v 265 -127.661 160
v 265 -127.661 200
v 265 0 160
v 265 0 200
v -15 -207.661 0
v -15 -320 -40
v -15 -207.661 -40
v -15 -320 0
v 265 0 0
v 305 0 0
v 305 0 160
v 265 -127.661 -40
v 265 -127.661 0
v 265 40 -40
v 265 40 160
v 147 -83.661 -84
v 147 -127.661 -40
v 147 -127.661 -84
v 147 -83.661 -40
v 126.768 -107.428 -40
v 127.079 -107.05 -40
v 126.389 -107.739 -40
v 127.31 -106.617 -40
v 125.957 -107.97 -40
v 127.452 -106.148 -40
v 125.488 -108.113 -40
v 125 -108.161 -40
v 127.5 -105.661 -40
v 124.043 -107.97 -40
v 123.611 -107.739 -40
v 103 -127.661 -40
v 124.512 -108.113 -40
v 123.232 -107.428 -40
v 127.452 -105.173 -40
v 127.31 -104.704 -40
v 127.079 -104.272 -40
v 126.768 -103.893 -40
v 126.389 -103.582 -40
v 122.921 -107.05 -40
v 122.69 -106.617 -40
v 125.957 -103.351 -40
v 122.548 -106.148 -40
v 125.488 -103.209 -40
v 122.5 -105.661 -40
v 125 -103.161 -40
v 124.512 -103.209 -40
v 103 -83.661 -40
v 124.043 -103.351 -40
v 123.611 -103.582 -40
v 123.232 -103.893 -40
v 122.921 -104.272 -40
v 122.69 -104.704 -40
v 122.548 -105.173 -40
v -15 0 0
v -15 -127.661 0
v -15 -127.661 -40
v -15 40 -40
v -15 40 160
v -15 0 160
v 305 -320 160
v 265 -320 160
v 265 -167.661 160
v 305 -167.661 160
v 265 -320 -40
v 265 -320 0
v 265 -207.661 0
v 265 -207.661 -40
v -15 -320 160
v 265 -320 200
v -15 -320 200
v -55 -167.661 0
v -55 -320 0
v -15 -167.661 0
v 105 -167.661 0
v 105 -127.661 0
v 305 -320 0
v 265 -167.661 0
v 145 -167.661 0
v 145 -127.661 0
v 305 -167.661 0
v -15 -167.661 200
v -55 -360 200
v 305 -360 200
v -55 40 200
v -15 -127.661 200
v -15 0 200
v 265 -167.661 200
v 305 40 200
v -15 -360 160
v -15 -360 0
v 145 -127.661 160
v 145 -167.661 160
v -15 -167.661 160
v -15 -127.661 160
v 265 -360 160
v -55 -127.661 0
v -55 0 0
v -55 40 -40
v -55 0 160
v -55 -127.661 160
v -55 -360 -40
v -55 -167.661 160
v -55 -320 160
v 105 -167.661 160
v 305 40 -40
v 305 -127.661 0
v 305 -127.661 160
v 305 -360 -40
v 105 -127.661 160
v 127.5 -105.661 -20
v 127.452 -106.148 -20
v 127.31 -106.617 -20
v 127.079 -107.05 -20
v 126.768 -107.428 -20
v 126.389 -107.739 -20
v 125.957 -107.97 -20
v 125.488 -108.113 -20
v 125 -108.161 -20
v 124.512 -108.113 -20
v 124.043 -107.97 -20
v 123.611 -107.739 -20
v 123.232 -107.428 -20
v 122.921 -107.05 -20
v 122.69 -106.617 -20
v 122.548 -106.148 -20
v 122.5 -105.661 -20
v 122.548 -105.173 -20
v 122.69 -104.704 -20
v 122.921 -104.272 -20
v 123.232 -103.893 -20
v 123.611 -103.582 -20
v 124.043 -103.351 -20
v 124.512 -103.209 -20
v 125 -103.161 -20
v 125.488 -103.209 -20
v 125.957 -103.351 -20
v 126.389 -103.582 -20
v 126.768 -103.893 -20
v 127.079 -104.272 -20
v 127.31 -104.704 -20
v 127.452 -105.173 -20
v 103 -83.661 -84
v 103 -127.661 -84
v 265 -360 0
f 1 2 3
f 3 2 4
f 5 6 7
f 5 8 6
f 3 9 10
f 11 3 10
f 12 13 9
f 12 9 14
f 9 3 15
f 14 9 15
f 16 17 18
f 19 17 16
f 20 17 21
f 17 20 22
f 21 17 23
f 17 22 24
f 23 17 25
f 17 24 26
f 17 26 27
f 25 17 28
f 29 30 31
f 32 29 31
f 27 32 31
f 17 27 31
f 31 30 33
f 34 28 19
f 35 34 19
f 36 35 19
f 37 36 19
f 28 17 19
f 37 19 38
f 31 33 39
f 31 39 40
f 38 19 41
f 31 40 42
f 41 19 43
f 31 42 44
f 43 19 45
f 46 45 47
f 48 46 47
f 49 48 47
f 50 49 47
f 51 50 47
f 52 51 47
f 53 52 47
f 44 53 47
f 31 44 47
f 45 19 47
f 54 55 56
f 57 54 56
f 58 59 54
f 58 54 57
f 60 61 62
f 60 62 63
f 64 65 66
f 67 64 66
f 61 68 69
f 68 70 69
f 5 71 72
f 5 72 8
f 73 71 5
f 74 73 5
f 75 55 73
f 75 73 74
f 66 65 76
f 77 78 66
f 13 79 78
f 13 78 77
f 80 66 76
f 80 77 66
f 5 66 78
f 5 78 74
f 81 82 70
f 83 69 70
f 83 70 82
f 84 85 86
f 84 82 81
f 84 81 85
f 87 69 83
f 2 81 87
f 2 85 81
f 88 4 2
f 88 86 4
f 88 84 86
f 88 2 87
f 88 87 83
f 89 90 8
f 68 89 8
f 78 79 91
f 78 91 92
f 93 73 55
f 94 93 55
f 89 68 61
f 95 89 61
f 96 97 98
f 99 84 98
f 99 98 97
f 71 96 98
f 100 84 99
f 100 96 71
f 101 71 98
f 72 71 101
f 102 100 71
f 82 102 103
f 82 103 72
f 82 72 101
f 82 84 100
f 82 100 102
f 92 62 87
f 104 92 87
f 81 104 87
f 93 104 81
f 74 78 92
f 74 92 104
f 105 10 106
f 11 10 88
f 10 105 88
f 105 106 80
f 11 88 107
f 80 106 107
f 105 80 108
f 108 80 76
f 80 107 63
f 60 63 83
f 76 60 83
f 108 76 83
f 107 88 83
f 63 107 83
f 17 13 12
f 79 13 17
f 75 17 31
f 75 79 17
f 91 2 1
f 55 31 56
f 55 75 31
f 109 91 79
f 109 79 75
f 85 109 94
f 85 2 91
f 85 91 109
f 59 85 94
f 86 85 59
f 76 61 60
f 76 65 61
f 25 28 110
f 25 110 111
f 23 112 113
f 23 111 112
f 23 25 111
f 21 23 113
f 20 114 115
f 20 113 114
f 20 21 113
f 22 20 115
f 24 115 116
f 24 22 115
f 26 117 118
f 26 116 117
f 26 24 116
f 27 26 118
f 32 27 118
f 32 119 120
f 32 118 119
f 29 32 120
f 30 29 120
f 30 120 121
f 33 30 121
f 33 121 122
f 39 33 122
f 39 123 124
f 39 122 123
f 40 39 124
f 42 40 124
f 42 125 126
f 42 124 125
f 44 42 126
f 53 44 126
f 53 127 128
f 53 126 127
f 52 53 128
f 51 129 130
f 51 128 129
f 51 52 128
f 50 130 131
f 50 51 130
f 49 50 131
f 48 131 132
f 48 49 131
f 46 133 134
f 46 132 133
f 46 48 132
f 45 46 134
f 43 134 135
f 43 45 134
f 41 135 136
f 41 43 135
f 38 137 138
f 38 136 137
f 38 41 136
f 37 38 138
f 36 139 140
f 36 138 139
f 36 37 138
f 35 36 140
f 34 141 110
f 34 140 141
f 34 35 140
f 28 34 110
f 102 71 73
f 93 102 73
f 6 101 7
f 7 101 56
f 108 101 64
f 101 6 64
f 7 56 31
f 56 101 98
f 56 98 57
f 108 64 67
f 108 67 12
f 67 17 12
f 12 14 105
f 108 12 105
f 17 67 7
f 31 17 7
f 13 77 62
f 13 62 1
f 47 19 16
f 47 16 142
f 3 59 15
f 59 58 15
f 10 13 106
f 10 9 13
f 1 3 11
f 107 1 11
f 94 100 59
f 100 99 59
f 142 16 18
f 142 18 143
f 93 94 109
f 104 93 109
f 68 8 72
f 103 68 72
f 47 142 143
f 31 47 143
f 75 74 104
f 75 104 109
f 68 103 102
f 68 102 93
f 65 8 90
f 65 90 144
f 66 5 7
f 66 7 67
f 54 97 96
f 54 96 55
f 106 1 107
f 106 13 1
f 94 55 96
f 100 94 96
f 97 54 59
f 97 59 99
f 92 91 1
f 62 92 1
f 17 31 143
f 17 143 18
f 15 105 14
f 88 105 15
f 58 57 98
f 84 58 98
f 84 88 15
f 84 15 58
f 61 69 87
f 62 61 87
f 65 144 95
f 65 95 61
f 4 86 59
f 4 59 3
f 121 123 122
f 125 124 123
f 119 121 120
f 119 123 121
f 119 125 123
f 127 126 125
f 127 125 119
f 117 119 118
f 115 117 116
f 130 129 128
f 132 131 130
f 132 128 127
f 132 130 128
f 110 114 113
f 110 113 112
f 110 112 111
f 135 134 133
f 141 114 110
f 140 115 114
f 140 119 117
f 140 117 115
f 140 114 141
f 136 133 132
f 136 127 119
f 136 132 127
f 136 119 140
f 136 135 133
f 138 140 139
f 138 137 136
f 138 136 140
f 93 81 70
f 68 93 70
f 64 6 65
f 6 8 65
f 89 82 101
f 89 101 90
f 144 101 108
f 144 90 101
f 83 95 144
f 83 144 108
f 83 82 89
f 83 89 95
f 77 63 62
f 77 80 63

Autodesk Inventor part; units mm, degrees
ref_plane "YZ Plane" through (0, 0, 0) normal (1, 0, 0) x (0, 1, 0)
ref_plane "XZ Plane" through (0, 0, 0) normal (0, 1, 0) x (-1, 0, 0)
ref_plane "XY Plane" through (0, 0, 0) normal (0, 0, 1) x (1, 0, 0)
sketch "Sketch1" plane through (0, 0, 0) normal (0, 0, 1) x (1, 0, 0)
  line L0 (250, 0) -> (0, 0) projected
  line L1 (250, 0) -> (250, 40) projected
  line L2 (211.5, 40) -> (250, 40) projected
  line L3 (161.5, 40) -> (211.5, 40) projected
  line L4 (88.5, 40) -> (161.5, 40) projected
  line L5 (38.5, 40) -> (88.5, 40) projected
  line L6 (0, 40) -> (38.5, 40) projected
  line L7 (0, 0) -> (0, 40) projected
  line L8 (-15, 40) -> (-55, 40)
  line L9 (-55, 40) -> (-55, -360)
  line L10 (-55, -360) -> (-15, -360)
  line L11 (-15, -360) -> (-15, 40)
  line L12 (265, 40) -> (305, 40)
  line L13 (305, 40) -> (305, -360)
  line L14 (305, -360) -> (265, -360)
  line L15 (265, -360) -> (265, 40)
  line L16 (265, -360) -> (-15, -360)
  line L17 (-15, -360) -> (-15, -320)
  line L18 (-15, -320) -> (265, -320)
  line L19 (265, -320) -> (265, -360)
  line L20 (265, -127.6607) -> (-15, -127.6607)
  line L21 (-15, -127.6607) -> (-15, -207.6607)
  line L22 (-15, -207.6607) -> (265, -207.6607)
  line L23 (265, -207.6607) -> (265, -127.6607)
  dimension "d0" = 40
  dimension "d1" = 400
  dimension "d2" = 40
  dimension "d3" = 400
  dimension "d4" = 15
  dimension "d5" = 15
  dimension "d6" = 40
  dimension "d9" = 80
extrude "Extrusion1" add sketch "Sketch1" against normal blind 40 contours L11 L10 L9 L8 | L20 L15 L22 L11 | L15 L12 L13 L14 | L11 L18 L15 L16
sketch "Sketch2" plane through (0, 0, -40) normal (0, 0, -1) x (-1, 0, 0)
  line L0 (-265, -207.6607) -> (15, -207.6607) projected
  line L1 (15, -207.6607) -> (15, -320) projected
  line L2 (15, -320) -> (-265, -320) projected
  line L3 (-265, -320) -> (-265, -207.6607) projected
  line L4 (-265, -127.6607) -> (-265, 40) projected
  line L5 (-265, 40) -> (-305, 40) projected
  line L6 (-305, 40) -> (-305, -360) projected
  line L7 (-305, -360) -> (55, -360) projected
  line L8 (55, -360) -> (55, 40) projected
  line L9 (55, 40) -> (15, 40) projected
  line L10 (15, 40) -> (15, -127.6607) projected
  line L11 (15, -127.6607) -> (-265, -127.6607) projected
  line L12 (-103, -127.6607) -> (-147, -127.6607)
  line L13 (-147, -127.6607) -> (-147, -83.6607)
  line L14 (-147, -83.6607) -> (-103, -83.6607)
  line L15 (-103, -83.6607) -> (-103, -127.6607)
  point P0 (0, 0)
  dimension "d10" = 44
  dimension "d11" = 44
  dimension "d12" = 118
  dimension "d13" = 118
extrude "Extrusion2" add sketch "Sketch2" along normal blind 44 contours L13 L14 L15 L11
sketch "Sketch3" plane through (0, 0, -40) normal (0, 0, 1) x (1, 0, 0)
  line L0 (103, -127.6607) -> (103, -83.6607) projected
  line L1 (103, -127.6607) -> (147, -127.6607) projected
  line L2 (147, -83.6607) -> (147, -127.6607) projected
  line L3 (103, -83.6607) -> (147, -83.6607) projected
  circle A0 centre (125, -105.6607) radius 2.5
  point P0 (0, 0)
  dimension "d16" = 5
extrude "Extrusion3" add sketch "Sketch3" along normal blind 20 contours A0
sketch "Sketch4" plane through (0, 0, 0) normal (0, 0, 1) x (1, 0, 0)
  line L0 (147, -127.6607) -> (265, -127.6607) projected
  line L1 (103, -127.6607) -> (147, -127.6607) projected
  line L2 (125, -127.6607) -> (125, -147.6607)
  line L3 (105, -127.6607) -> (145, -127.6607)
  line L4 (145, -127.6607) -> (145, -167.6607)
  line L5 (145, -167.6607) -> (105, -167.6607)
  line L6 (105, -167.6607) -> (105, -127.6607)
  line L7 (105, -127.6607) -> (145, -167.6607) construction
  line L8 (145, -127.6607) -> (105, -167.6607) construction
  line L9 (305, -360) -> (-55, -360) projected
  line L10 (-15, -320) -> (265, -320) projected
  line L11 (305, -360) -> (265, -360)
  line L12 (265, -360) -> (265, -320)
  line L13 (265, -320) -> (305, -320)
  line L14 (305, -320) -> (305, -360)
  line L15 (-15, -207.6607) -> (-15, -320) projected
  line L16 (-55, -360) -> (-15, -360)
  line L17 (-15, -360) -> (-15, -320)
  line L18 (-15, -320) -> (-55, -320)
  line L19 (-55, -320) -> (-55, -360)
  line L20 (305, -360) -> (305, 40) projected
  line L21 (265, -127.6607) -> (305, -127.6607)
  line L22 (305, -127.6607) -> (305, -167.6607)
  line L23 (305, -167.6607) -> (265, -167.6607)
  line L24 (265, -167.6607) -> (265, -127.6607)
  line L25 (-15, 40) -> (-15, -127.6607) projected
  line L26 (-55, -360) -> (-55, 40) projected
  line L27 (-15, -127.6607) -> (-55, -127.6607)
  line L28 (-55, -127.6607) -> (-55, -167.6607)
  line L29 (-55, -167.6607) -> (-15, -167.6607)
  line L30 (-15, -167.6607) -> (-15, -127.6607)
  line L31 (305, 40) -> (265, 40)
  line L32 (265, 40) -> (265, 0)
  line L33 (265, 0) -> (305, 0)
  line L34 (305, 0) -> (305, 40)
  line L35 (-55, 40) -> (-15, 40)
  line L36 (-15, 40) -> (-15, 0)
  line L37 (-15, 0) -> (-55, 0)
  line L38 (-55, 0) -> (-55, 40)
  point P0 (0, 0)
  dimension "d21" = 20
  dimension "d22" = 40
  dimension "d23" = 40
  dimension "d28" = 40
  dimension "d29" = 40
  dimension "d30" = 40
  dimension "d31" = 40
extrude "Extrusion4" add sketch "Sketch4" along normal blind 200 contours L33 L32 L31 L20 | L26 L27 L30 L29 | L14 L9 L12 L13 | L21 L20 L23 L24 | L4 L5 L6 L1 | L17 L9 L19 L18 | L26 L35 L25 L37
sketch "Sketch5" plane through (0, 0, 200) normal (0, 0, 1) x (1, 0, 0)
  line L0 (265, -167.6607) -> (305, -167.6607) projected
  line L1 (305, -360) -> (305, -320) projected
  line L2 (265, -167.6607) -> (305, -167.6607)
  line L3 (305, -167.6607) -> (305, -320)
  line L4 (305, -320) -> (265, -320)
  line L5 (265, -320) -> (265, -167.6607)
  line L6 (265, -167.6607) -> (145, -167.6607)
  line L7 (145, -167.6607) -> (145, -127.6607)
  line L8 (145, -127.6607) -> (265, -127.6607)
  line L9 (265, -127.6607) -> (265, -167.6607)
  line L10 (105, -167.6607) -> (145, -167.6607) projected
  line L11 (105, -167.6607) -> (-15, -167.6607)
  line L12 (-15, -167.6607) -> (-15, -127.6607)
  line L13 (-15, -127.6607) -> (105, -127.6607)
  line L14 (105, -127.6607) -> (105, -167.6607)
  line L15 (-55, -127.6607) -> (-55, -167.6607) projected
  line L16 (-55, -167.6607) -> (-15, -167.6607)
  line L17 (-15, -167.6607) -> (-15, -320)
  line L18 (-15, -320) -> (-55, -320)
  line L19 (-55, -320) -> (-55, -167.6607)
  line L20 (-15, -320) -> (265, -320)
  line L21 (265, -320) -> (265, -360)
  line L22 (265, -360) -> (-15, -360)
  line L23 (-15, -360) -> (-15, -320)
  line L24 (305, -167.6607) -> (305, -127.6607) projected
  line L25 (265, 40) -> (265, 0) projected
  line L26 (305, -127.6607) -> (265, -127.6607)
  line L27 (265, -127.6607) -> (265, 0)
  line L28 (265, 0) -> (305, 0)
  line L29 (305, 0) -> (305, -127.6607)
  line L30 (265, 40) -> (-15, 40)
  line L31 (-15, 40) -> (-15, 0)
  line L32 (-15, 0) -> (265, 0)
  line L33 (265, 0) -> (265, 40)
  line L34 (-15, 0) -> (-55, 0)
  line L35 (-55, 0) -> (-55, -127.6607)
  line L36 (-55, -127.6607) -> (-15, -127.6607)
  line L37 (-15, -127.6607) -> (-15, 0)
  point P0 (0, 0)
extrude "Extrusion5" add sketch "Sketch5" against normal blind 40 contours L0 L3 L4 L5 | L6 L7 L8 L9 | L21 L22 L23 L20 | L27 L28 L29 L26 | L18 L19 L16 L17 | L11 L12 L13 L14 | L32 L31 L30 L25 | L37 L36 L35 L34
properties part number "BSF_OuterFrame"
